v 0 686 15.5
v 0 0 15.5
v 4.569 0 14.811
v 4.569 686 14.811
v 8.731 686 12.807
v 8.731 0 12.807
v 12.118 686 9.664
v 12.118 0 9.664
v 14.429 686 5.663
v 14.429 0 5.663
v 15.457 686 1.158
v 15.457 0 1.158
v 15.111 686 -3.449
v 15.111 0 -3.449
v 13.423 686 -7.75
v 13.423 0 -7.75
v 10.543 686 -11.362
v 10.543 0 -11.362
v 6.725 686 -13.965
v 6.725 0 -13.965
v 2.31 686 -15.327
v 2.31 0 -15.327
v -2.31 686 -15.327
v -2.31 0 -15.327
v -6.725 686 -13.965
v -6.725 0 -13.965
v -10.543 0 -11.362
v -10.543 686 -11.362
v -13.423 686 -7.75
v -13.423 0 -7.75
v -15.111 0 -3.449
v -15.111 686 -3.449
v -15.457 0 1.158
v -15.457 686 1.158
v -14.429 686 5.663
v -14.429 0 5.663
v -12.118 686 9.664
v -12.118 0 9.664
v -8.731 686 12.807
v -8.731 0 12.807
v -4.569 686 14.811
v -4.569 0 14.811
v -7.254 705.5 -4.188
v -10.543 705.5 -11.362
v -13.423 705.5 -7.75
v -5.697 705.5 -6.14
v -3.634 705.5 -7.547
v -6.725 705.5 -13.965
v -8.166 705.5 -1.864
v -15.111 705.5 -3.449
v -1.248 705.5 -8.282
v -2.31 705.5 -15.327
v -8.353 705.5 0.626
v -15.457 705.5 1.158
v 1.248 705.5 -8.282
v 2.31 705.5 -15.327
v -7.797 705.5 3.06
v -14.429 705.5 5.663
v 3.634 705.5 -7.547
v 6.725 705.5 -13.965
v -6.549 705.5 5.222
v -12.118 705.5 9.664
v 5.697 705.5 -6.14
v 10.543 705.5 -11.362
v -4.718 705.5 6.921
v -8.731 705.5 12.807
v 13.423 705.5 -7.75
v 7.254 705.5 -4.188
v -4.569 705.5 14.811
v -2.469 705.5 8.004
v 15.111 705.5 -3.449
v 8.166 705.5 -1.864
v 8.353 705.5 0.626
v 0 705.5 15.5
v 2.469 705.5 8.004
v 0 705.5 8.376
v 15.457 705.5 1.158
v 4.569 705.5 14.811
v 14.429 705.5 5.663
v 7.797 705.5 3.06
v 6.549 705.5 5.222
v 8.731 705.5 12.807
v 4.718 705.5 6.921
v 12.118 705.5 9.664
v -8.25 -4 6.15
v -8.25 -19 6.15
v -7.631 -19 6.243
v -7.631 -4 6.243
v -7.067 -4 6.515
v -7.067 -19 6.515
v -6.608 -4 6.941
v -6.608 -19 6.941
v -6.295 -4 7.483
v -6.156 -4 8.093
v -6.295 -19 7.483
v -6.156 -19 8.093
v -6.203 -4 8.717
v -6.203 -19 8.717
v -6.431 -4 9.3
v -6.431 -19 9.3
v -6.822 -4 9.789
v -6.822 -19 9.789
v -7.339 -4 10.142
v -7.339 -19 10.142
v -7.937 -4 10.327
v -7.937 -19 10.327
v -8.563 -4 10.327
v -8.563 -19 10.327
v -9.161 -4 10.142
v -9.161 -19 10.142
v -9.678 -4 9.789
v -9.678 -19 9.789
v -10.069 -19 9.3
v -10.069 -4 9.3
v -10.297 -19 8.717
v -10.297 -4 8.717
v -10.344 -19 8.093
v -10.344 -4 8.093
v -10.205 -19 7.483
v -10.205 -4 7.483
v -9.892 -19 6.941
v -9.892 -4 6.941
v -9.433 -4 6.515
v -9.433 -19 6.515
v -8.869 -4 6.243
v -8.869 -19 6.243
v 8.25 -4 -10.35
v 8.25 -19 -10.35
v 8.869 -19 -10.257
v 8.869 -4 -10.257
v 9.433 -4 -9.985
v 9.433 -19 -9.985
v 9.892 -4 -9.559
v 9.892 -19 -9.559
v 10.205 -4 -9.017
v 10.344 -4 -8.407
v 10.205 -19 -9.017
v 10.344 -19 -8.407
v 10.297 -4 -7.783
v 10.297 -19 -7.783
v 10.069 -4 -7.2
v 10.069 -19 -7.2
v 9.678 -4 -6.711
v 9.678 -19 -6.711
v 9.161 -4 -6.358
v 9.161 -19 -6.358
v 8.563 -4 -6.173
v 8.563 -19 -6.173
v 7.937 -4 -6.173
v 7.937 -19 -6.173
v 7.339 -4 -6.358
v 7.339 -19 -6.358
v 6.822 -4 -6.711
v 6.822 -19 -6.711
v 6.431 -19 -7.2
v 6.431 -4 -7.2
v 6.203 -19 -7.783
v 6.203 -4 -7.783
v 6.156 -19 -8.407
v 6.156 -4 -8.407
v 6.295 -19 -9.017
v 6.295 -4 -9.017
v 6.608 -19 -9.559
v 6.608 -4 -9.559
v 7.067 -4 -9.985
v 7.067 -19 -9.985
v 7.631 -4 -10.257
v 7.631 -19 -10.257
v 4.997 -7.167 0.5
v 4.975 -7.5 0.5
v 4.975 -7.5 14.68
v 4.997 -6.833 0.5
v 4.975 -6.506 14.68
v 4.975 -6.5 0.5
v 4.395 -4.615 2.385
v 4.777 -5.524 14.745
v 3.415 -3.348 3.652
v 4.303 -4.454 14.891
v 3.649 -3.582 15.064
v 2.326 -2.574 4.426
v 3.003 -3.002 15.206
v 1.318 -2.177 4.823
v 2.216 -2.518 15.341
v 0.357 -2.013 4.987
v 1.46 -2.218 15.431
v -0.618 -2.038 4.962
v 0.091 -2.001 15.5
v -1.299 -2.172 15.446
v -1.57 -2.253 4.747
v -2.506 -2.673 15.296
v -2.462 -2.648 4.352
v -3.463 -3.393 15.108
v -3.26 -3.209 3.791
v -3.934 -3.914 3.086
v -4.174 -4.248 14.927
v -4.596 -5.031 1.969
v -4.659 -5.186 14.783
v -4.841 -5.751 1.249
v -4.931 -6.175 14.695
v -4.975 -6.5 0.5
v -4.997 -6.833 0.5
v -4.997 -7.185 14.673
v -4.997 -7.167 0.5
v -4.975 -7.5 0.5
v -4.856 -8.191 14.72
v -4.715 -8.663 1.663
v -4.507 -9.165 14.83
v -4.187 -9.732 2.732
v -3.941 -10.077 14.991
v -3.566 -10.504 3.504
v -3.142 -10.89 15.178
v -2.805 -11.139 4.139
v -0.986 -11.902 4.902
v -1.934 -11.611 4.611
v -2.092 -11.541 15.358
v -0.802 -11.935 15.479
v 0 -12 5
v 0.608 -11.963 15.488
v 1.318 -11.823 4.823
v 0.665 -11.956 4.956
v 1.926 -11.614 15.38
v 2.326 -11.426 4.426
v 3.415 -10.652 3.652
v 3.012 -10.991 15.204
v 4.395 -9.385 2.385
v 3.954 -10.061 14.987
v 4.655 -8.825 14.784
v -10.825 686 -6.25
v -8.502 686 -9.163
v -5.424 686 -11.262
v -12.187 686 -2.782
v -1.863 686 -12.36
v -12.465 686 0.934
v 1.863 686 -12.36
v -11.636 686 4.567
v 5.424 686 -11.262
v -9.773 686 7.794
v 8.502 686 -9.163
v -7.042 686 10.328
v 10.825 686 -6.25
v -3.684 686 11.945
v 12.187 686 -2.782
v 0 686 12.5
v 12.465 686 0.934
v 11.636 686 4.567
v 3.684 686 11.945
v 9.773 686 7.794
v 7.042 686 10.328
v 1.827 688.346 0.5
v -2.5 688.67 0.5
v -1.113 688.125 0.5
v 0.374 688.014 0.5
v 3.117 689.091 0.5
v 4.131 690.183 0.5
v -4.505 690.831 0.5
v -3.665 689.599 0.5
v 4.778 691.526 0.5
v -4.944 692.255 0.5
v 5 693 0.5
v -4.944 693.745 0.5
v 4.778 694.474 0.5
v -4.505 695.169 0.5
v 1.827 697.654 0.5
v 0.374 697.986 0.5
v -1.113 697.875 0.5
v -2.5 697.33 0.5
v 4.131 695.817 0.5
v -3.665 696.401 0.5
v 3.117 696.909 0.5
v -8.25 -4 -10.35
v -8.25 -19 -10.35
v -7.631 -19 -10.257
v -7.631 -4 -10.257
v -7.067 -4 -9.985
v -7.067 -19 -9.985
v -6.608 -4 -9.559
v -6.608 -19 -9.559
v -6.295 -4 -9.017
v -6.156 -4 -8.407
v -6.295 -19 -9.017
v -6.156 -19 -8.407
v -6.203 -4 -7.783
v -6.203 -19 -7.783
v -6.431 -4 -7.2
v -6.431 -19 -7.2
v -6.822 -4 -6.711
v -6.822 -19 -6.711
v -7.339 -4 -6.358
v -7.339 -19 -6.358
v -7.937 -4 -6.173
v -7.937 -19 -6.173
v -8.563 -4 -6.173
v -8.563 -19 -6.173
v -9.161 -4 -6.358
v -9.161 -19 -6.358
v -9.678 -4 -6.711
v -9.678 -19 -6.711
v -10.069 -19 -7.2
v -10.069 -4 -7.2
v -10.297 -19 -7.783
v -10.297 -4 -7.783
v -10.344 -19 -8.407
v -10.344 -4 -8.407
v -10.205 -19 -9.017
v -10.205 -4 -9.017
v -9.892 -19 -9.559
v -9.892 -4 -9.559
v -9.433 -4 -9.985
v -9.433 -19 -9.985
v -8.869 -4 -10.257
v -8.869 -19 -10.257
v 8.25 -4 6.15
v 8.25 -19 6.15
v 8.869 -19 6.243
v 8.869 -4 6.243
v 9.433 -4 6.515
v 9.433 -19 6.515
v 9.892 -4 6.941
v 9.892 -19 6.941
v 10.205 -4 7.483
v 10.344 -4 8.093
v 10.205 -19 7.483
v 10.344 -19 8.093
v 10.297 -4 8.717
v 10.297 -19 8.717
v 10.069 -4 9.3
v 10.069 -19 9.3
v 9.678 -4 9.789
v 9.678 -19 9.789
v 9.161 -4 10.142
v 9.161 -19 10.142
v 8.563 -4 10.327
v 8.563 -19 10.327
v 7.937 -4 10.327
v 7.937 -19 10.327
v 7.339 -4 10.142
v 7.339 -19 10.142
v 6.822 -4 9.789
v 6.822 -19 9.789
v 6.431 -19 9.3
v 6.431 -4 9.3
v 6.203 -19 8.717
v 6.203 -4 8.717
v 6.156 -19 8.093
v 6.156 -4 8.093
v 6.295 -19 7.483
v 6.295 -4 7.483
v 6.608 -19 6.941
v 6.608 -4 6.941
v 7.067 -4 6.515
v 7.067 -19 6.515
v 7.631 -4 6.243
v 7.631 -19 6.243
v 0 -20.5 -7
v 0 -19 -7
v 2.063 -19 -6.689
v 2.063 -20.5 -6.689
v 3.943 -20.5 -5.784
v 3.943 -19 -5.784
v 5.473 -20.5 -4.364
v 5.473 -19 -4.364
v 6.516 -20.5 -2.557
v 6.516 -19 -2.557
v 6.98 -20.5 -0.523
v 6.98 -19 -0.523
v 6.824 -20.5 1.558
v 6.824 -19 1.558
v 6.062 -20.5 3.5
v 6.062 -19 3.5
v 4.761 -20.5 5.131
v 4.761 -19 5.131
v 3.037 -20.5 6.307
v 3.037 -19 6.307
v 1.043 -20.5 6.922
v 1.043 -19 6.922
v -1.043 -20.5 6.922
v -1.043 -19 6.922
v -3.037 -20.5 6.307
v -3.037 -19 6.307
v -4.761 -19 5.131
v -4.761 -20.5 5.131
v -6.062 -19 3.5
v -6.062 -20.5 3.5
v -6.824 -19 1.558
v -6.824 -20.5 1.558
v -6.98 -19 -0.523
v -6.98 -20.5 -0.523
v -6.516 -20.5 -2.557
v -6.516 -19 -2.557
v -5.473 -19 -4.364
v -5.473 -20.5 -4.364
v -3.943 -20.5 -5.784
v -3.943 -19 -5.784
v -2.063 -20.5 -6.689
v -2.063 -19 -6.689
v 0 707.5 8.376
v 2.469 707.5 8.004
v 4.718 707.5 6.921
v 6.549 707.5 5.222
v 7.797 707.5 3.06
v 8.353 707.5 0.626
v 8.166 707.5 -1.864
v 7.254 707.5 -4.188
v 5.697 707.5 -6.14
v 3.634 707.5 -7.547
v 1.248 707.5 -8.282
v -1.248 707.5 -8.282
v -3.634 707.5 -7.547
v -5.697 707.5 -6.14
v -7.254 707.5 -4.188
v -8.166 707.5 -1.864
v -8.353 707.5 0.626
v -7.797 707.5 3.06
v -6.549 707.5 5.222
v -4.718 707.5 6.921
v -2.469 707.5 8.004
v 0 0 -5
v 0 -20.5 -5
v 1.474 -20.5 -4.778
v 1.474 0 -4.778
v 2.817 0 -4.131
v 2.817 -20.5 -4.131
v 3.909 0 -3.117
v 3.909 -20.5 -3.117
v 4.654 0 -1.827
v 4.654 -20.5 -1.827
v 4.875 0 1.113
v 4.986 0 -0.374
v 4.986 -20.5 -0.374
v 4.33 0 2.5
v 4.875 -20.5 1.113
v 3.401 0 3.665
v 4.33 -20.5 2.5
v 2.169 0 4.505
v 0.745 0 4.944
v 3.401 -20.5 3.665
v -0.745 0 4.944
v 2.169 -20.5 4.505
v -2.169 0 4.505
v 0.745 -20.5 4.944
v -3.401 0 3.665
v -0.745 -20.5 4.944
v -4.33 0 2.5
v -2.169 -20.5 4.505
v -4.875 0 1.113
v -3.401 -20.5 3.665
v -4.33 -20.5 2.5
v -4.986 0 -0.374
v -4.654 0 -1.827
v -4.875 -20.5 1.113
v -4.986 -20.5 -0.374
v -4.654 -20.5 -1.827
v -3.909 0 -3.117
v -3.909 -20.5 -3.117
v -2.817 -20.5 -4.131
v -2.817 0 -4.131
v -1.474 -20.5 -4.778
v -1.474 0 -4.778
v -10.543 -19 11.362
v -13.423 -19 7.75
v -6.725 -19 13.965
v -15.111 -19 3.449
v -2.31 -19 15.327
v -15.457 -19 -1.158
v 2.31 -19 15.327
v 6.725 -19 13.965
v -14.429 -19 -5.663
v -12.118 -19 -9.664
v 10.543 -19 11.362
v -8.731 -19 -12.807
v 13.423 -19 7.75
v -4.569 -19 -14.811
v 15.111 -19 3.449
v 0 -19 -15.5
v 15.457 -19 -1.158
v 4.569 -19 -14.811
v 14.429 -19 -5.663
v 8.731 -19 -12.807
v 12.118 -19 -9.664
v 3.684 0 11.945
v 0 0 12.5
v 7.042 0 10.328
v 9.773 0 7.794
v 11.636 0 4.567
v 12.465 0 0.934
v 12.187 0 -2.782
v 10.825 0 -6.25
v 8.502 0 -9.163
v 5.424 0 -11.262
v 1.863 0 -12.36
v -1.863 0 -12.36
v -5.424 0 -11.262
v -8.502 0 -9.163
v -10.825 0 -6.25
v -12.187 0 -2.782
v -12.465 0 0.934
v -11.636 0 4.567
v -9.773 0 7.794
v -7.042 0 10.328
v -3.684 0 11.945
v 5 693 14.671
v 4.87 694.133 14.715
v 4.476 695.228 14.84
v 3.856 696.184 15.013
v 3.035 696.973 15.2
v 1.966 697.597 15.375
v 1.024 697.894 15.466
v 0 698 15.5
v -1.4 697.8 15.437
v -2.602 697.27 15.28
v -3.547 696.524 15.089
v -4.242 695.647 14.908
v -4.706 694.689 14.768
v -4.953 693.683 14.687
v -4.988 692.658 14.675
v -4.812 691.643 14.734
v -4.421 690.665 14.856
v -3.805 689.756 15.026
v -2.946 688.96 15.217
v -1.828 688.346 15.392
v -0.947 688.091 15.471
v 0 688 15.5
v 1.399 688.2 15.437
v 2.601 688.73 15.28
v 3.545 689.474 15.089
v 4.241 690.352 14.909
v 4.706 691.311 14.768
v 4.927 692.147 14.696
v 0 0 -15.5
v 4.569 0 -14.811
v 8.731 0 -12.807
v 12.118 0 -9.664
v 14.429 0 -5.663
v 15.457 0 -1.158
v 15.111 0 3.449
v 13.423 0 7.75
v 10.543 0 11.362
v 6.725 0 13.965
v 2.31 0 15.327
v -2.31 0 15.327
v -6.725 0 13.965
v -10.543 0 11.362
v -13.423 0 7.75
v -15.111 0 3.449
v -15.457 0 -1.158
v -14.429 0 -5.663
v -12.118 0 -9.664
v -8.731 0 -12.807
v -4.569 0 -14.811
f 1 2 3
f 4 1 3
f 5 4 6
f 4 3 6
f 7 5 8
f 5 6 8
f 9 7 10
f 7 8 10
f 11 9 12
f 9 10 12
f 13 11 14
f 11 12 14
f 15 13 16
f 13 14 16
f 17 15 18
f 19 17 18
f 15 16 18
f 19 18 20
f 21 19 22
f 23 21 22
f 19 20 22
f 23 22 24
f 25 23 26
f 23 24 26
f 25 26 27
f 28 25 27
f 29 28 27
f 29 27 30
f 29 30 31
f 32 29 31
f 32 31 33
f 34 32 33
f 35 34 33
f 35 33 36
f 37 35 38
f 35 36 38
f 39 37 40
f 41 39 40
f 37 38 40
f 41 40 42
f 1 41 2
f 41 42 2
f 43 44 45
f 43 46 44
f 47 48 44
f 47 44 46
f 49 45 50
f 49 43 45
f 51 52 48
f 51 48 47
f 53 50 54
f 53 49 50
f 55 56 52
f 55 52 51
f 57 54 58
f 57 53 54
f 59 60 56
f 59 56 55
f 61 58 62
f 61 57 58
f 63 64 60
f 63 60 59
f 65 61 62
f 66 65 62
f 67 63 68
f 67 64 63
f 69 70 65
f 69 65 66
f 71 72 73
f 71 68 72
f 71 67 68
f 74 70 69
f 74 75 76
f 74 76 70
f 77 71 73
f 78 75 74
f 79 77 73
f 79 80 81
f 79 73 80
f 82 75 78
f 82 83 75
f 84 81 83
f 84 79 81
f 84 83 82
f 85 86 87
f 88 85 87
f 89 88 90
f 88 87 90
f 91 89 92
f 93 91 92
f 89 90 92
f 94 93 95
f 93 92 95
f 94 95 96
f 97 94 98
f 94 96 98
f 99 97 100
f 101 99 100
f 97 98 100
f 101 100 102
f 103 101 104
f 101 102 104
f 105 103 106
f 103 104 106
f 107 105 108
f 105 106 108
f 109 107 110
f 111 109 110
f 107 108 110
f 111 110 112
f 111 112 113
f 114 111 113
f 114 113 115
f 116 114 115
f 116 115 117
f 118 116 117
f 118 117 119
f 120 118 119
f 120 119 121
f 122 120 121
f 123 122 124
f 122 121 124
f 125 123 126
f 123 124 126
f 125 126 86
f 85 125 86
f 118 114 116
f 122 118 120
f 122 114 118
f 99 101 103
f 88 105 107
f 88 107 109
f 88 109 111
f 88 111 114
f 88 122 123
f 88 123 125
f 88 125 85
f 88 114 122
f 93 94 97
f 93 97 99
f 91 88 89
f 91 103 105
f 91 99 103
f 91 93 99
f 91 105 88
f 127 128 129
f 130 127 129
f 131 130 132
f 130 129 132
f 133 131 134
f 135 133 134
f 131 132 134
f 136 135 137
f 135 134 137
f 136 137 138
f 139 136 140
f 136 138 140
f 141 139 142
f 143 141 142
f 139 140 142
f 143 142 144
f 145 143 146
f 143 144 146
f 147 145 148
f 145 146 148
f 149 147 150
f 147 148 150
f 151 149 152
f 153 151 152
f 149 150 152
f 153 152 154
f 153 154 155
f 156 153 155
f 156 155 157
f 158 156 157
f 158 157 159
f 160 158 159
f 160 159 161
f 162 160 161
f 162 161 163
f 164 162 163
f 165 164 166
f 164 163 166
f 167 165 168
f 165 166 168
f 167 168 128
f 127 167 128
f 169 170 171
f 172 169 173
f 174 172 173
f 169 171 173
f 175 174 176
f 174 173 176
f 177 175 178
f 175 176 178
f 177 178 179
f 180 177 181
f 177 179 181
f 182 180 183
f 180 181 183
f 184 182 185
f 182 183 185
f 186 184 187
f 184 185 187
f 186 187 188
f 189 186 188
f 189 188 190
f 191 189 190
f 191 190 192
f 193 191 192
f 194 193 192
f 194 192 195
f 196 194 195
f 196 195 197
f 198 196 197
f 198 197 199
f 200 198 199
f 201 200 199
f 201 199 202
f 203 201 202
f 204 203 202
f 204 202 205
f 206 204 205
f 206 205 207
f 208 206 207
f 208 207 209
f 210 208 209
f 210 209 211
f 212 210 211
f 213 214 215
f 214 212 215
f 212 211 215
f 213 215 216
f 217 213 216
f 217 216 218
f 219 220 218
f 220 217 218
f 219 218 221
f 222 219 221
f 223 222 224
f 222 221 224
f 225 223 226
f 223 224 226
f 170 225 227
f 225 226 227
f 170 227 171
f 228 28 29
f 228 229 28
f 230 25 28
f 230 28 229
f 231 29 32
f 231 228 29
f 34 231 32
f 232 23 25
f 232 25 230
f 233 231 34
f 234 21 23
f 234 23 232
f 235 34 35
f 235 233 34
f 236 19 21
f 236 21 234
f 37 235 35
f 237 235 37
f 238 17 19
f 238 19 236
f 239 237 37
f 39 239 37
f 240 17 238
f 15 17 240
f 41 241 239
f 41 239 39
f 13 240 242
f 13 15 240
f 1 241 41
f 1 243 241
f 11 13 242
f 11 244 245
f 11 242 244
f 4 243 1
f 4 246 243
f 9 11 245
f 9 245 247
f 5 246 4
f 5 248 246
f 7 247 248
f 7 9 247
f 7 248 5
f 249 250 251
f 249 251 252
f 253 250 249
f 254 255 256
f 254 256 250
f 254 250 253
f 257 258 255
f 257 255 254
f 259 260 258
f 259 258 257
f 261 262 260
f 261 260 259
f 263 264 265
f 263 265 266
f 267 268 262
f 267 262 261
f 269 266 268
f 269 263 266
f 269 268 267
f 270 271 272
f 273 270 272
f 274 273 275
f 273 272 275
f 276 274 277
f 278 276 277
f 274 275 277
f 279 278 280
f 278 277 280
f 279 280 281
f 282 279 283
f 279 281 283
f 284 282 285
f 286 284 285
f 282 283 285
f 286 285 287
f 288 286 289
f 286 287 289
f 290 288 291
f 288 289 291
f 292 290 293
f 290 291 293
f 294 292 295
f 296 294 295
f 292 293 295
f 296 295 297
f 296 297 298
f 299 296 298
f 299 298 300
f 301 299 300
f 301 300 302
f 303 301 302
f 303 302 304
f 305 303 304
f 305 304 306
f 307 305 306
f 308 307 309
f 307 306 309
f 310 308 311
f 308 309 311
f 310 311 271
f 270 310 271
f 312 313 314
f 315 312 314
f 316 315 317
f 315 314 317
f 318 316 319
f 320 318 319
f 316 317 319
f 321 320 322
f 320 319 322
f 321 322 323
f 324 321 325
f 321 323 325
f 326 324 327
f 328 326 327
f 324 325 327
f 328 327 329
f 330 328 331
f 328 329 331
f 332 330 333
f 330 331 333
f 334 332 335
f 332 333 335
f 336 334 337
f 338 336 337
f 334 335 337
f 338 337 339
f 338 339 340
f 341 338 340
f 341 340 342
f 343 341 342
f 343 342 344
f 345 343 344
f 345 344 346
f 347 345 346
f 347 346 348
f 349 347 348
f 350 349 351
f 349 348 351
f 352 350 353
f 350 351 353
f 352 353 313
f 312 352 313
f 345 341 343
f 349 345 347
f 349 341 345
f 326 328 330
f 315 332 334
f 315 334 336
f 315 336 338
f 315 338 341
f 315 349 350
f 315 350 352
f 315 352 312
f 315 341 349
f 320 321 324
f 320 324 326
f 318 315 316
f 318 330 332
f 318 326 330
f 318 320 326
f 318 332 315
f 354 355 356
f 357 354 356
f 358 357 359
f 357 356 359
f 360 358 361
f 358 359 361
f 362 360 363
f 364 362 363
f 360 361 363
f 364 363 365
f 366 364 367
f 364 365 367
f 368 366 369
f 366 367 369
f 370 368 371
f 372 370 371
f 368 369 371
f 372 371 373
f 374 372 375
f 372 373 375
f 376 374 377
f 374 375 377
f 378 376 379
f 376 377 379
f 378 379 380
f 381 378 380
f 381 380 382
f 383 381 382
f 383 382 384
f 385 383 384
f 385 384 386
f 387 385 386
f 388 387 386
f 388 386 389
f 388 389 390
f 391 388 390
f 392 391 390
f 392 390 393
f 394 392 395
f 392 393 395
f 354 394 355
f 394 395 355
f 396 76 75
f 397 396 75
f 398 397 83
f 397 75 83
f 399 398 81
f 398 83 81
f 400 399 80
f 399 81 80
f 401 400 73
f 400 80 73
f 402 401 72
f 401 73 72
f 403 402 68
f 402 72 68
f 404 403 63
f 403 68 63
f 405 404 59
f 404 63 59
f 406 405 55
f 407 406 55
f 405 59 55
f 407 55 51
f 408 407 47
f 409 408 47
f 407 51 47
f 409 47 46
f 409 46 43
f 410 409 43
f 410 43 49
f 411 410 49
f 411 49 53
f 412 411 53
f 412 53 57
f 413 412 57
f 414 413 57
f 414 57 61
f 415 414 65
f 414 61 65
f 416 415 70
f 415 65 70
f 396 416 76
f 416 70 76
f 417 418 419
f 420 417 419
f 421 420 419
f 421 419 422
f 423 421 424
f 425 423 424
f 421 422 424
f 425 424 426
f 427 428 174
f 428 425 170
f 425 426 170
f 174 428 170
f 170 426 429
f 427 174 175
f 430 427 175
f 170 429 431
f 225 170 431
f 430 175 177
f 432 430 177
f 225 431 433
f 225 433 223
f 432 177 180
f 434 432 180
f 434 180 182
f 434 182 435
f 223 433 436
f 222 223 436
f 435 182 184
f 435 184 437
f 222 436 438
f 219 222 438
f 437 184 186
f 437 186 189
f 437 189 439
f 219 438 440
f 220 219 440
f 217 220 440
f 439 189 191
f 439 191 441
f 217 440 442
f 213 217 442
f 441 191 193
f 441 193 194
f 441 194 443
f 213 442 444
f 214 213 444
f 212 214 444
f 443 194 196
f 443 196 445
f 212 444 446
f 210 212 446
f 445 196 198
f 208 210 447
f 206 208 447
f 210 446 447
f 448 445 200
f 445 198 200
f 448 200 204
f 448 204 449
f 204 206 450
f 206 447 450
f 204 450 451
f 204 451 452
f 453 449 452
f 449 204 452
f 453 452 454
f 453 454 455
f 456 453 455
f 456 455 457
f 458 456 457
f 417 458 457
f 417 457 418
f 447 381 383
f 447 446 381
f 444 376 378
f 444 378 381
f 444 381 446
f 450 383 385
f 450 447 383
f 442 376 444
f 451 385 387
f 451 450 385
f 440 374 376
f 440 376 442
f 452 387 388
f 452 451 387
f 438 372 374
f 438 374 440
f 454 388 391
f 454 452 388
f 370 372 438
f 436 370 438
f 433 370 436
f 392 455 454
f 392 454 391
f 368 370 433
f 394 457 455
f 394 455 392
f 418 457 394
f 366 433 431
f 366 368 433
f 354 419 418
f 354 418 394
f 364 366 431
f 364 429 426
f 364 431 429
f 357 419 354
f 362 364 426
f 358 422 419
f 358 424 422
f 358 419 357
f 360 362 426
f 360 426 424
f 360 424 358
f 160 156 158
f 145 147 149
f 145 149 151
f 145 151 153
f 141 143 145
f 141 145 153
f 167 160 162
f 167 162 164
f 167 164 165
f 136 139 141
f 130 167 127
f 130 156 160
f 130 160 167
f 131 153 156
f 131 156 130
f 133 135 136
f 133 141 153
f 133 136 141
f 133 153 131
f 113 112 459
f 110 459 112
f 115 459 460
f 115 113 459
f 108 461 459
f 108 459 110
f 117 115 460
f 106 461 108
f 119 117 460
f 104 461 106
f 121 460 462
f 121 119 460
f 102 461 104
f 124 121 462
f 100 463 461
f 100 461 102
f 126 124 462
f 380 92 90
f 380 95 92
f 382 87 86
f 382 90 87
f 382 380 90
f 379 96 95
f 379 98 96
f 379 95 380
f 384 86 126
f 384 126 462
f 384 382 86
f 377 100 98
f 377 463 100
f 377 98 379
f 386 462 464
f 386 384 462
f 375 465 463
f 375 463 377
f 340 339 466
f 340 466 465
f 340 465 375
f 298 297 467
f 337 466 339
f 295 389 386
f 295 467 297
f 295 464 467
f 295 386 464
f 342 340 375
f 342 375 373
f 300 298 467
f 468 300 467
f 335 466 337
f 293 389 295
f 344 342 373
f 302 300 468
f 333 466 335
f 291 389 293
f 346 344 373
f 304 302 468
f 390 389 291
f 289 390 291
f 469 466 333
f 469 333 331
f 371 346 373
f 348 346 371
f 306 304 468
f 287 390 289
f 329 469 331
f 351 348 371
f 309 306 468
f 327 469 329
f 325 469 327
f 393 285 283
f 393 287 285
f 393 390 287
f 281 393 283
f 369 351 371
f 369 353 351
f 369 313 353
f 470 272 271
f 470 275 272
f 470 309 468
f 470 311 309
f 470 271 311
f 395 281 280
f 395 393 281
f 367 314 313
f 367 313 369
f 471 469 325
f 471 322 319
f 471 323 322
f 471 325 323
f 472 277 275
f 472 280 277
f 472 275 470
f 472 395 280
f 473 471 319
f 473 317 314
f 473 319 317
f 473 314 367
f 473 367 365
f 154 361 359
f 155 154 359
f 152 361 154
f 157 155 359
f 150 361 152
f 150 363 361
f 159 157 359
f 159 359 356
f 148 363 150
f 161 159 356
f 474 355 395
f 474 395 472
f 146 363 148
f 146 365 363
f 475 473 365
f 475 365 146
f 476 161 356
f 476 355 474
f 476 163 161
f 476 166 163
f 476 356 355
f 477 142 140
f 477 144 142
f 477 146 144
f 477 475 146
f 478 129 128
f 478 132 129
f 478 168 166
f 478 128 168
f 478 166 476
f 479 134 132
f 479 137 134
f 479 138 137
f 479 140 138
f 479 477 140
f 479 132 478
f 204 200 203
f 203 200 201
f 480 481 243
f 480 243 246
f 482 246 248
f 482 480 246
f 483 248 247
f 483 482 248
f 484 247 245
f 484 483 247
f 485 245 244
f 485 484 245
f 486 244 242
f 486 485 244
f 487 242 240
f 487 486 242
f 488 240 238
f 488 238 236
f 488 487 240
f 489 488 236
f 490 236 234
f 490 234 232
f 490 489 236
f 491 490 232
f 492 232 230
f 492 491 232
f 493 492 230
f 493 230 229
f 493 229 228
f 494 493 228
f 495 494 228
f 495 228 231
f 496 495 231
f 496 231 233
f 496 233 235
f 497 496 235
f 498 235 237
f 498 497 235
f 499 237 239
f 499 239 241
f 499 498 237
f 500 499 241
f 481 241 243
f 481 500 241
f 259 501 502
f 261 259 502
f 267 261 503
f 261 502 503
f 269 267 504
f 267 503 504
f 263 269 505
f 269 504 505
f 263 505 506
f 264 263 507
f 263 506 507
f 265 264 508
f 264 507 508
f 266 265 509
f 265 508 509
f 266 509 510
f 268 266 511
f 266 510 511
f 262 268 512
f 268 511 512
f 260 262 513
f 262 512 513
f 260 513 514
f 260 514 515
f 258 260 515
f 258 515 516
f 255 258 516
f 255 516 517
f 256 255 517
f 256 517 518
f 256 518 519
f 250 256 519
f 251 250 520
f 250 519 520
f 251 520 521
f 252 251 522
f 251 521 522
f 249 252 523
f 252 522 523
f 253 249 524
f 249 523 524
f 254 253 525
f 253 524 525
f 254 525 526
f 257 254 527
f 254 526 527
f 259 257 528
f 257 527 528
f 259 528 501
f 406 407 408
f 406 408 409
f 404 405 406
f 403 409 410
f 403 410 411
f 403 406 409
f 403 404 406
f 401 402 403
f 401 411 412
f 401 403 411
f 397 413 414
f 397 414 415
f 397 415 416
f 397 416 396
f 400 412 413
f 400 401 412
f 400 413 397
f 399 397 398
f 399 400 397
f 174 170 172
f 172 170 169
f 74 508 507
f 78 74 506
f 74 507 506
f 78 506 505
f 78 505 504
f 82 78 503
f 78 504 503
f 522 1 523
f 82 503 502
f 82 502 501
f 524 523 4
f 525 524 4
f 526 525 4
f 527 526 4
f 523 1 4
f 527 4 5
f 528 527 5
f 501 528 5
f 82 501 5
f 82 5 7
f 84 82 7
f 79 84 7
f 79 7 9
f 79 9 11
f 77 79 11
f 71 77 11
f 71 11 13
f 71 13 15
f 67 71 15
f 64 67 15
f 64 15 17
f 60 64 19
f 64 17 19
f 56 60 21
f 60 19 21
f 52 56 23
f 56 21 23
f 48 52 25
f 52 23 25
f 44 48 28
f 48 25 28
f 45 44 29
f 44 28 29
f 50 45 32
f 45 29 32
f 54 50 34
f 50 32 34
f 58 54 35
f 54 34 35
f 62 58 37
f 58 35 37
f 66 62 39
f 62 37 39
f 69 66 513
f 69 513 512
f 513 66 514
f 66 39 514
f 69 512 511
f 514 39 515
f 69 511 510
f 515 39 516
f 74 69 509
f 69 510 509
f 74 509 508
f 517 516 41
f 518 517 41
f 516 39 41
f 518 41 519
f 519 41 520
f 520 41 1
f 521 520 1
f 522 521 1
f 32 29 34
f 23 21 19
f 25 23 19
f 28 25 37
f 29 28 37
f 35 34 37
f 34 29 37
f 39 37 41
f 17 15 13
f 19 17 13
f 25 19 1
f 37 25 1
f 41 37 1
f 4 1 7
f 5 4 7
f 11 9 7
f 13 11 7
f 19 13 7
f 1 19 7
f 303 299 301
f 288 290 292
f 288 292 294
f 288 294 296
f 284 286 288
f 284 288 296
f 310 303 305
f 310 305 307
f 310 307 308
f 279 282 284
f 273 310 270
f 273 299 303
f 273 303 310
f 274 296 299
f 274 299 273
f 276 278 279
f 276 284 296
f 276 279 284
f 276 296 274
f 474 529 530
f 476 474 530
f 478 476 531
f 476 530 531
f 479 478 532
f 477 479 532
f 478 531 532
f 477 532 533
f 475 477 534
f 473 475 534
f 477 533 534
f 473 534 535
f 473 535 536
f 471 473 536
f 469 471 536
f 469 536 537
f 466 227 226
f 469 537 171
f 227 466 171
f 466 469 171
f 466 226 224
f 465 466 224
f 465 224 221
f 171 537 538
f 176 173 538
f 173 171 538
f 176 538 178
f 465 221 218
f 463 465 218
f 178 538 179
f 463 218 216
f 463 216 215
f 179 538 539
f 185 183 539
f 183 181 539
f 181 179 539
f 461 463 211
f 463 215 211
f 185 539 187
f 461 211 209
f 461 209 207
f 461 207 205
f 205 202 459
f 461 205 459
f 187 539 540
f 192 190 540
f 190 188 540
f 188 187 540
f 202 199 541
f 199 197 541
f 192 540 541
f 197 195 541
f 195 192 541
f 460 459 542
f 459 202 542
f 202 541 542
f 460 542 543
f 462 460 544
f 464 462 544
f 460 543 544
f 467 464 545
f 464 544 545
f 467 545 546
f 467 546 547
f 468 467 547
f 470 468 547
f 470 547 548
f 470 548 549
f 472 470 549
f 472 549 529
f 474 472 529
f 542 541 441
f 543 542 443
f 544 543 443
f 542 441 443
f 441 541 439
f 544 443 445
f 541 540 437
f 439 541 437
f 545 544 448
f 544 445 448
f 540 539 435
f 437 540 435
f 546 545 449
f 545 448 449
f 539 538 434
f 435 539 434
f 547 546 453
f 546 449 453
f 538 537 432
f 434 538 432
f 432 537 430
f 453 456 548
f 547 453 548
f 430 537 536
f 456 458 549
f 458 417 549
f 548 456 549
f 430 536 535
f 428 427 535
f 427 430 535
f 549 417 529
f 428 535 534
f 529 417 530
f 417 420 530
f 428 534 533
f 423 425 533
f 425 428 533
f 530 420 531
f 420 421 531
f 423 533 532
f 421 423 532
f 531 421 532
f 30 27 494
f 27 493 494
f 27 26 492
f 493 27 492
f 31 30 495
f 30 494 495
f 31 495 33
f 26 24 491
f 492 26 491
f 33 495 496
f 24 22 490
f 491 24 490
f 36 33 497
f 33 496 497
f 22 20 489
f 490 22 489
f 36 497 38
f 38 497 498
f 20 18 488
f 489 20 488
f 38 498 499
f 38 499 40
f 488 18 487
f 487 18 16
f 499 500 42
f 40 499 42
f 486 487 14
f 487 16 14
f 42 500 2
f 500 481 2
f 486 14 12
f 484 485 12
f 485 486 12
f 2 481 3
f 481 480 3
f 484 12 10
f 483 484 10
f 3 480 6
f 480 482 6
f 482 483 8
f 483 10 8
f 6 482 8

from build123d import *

# Parameters (mm, degrees)
SKETCH_1_R          = 15.5
SKETCH_1_R_2        = 12.5
EXTRUDE_1_DEPTH     = 686
SKETCH_2_R          = 15.5
EXTRUDE_2_DEPTH     = 19.5
SKETCH_3_R          = 8.375998957
EXTRUDE_3_DEPTH     = 2
SKETCH_4_R          = 15.5
EXTRUDE_4_DEPTH     = 19
SKETCH_5_R          = 7
EXTRUDE_5_DEPTH     = 1.5
SKETCH_6_R          = 5
CUT_EXTRUDE_6_DEPTH = 20.5
SKETCH_7_R          = 5
CUT_EXTRUDE_7_DEPTH = 15
SKETCH_8_R          = 2.1
CUT_EXTRUDE_8_DEPTH = 15


with BuildPart() as part:
    # 草图1 → 拉伸1 (new body)
    with BuildSketch(Plane(origin=(0, 0, 0), x_dir=(1, 0, 0), z_dir=(0, 1, 0))):
        with Locations(Location((0, 0, 0), (0, 0, 270))):
            Circle(SKETCH_1_R)
        with Locations(Location((0, 0, 0), (0, 0, 270))):
            Circle(SKETCH_1_R_2, mode=Mode.SUBTRACT)
    extrude(amount=EXTRUDE_1_DEPTH)


with BuildPart() as body_2:
    # 草图2 → 拉伸2 (new body)
    with BuildSketch(Plane(origin=(0, 686, 0), x_dir=(1, 0, 0), z_dir=(0, 1, 0))):
        with Locations(Location((0, 0, 0), (0, 0, 270))):
            Circle(SKETCH_2_R)
    extrude(amount=EXTRUDE_2_DEPTH)

    # 草图3 → 拉伸3 (add)
    with BuildSketch(Plane(origin=(0, 705.5, 0), x_dir=(1, 0, 0), z_dir=(0, 1, 0))):
        with Locations(Location((0, 0, 0), (0, 0, 270))):
            Circle(SKETCH_3_R)
    extrude(amount=EXTRUDE_3_DEPTH)


with BuildPart() as body_3:
    # 草图4 → 拉伸4 (new body)
    with BuildSketch(Plane.XZ):
        with Locations(Location((0, 0, 0), (0, 0, 270))):
            Circle(SKETCH_4_R)
    extrude(amount=EXTRUDE_4_DEPTH)

    # 草图5 → 拉伸5 (add)
    with BuildSketch(Plane.XZ.offset(19)):
        with Locations(Location((0, 0, 0), (0, 0, 270))):
            Circle(SKETCH_5_R)
    extrude(amount=EXTRUDE_5_DEPTH)

    # 草图6 → 拉伸6 (cut)
    with BuildSketch(Plane.XZ.offset(20.5)):
        with Locations(Location((0, 0, 0), (0, 0, 270))):
            Circle(SKETCH_6_R)
    extrude(amount=-CUT_EXTRUDE_6_DEPTH, mode=Mode.SUBTRACT)


with BuildPart() as cut_extrude_7_tool:
    # 草图7 → 拉伸7 (new body)
    with BuildSketch(Plane.XY.offset(15.5)):
        with Locations(Location((0, -7, 0), (0, 0, 354.260829523))):
            Circle(SKETCH_7_R)
        with Locations((0, 693)):
            Circle(SKETCH_7_R)
    extrude(amount=-CUT_EXTRUDE_7_DEPTH)


with BuildPart() as body_2_1:
    add(body_2.part)

    # 拉伸7: cut by cut_extrude_7_tool
    add(cut_extrude_7_tool.part, mode=Mode.SUBTRACT)


with BuildPart() as body_3_1:
    add(body_3.part)

    # 拉伸7: cut by cut_extrude_7_tool
    add(cut_extrude_7_tool.part, mode=Mode.SUBTRACT)

    # 草图8 → 拉伸8 (cut)
    with BuildSketch(Plane.XZ.offset(19)):
        with Locations(Location((-8.25, 8.25, 0), (0, 0, 270))):
            Circle(SKETCH_8_R)
        with Locations(Location((8.25, 8.25, 0), (0, 0, 270))):
            Circle(SKETCH_8_R)
        with Locations(Location((8.25, -8.25, 0), (0, 0, 270))):
            Circle(SKETCH_8_R)
        with Locations(Location((-8.25, -8.25, 0), (0, 0, 270))):
            Circle(SKETCH_8_R)
    extrude(amount=-CUT_EXTRUDE_8_DEPTH, mode=Mode.SUBTRACT)


solid = Compound([part.part, body_2_1.part, body_3_1.part])
